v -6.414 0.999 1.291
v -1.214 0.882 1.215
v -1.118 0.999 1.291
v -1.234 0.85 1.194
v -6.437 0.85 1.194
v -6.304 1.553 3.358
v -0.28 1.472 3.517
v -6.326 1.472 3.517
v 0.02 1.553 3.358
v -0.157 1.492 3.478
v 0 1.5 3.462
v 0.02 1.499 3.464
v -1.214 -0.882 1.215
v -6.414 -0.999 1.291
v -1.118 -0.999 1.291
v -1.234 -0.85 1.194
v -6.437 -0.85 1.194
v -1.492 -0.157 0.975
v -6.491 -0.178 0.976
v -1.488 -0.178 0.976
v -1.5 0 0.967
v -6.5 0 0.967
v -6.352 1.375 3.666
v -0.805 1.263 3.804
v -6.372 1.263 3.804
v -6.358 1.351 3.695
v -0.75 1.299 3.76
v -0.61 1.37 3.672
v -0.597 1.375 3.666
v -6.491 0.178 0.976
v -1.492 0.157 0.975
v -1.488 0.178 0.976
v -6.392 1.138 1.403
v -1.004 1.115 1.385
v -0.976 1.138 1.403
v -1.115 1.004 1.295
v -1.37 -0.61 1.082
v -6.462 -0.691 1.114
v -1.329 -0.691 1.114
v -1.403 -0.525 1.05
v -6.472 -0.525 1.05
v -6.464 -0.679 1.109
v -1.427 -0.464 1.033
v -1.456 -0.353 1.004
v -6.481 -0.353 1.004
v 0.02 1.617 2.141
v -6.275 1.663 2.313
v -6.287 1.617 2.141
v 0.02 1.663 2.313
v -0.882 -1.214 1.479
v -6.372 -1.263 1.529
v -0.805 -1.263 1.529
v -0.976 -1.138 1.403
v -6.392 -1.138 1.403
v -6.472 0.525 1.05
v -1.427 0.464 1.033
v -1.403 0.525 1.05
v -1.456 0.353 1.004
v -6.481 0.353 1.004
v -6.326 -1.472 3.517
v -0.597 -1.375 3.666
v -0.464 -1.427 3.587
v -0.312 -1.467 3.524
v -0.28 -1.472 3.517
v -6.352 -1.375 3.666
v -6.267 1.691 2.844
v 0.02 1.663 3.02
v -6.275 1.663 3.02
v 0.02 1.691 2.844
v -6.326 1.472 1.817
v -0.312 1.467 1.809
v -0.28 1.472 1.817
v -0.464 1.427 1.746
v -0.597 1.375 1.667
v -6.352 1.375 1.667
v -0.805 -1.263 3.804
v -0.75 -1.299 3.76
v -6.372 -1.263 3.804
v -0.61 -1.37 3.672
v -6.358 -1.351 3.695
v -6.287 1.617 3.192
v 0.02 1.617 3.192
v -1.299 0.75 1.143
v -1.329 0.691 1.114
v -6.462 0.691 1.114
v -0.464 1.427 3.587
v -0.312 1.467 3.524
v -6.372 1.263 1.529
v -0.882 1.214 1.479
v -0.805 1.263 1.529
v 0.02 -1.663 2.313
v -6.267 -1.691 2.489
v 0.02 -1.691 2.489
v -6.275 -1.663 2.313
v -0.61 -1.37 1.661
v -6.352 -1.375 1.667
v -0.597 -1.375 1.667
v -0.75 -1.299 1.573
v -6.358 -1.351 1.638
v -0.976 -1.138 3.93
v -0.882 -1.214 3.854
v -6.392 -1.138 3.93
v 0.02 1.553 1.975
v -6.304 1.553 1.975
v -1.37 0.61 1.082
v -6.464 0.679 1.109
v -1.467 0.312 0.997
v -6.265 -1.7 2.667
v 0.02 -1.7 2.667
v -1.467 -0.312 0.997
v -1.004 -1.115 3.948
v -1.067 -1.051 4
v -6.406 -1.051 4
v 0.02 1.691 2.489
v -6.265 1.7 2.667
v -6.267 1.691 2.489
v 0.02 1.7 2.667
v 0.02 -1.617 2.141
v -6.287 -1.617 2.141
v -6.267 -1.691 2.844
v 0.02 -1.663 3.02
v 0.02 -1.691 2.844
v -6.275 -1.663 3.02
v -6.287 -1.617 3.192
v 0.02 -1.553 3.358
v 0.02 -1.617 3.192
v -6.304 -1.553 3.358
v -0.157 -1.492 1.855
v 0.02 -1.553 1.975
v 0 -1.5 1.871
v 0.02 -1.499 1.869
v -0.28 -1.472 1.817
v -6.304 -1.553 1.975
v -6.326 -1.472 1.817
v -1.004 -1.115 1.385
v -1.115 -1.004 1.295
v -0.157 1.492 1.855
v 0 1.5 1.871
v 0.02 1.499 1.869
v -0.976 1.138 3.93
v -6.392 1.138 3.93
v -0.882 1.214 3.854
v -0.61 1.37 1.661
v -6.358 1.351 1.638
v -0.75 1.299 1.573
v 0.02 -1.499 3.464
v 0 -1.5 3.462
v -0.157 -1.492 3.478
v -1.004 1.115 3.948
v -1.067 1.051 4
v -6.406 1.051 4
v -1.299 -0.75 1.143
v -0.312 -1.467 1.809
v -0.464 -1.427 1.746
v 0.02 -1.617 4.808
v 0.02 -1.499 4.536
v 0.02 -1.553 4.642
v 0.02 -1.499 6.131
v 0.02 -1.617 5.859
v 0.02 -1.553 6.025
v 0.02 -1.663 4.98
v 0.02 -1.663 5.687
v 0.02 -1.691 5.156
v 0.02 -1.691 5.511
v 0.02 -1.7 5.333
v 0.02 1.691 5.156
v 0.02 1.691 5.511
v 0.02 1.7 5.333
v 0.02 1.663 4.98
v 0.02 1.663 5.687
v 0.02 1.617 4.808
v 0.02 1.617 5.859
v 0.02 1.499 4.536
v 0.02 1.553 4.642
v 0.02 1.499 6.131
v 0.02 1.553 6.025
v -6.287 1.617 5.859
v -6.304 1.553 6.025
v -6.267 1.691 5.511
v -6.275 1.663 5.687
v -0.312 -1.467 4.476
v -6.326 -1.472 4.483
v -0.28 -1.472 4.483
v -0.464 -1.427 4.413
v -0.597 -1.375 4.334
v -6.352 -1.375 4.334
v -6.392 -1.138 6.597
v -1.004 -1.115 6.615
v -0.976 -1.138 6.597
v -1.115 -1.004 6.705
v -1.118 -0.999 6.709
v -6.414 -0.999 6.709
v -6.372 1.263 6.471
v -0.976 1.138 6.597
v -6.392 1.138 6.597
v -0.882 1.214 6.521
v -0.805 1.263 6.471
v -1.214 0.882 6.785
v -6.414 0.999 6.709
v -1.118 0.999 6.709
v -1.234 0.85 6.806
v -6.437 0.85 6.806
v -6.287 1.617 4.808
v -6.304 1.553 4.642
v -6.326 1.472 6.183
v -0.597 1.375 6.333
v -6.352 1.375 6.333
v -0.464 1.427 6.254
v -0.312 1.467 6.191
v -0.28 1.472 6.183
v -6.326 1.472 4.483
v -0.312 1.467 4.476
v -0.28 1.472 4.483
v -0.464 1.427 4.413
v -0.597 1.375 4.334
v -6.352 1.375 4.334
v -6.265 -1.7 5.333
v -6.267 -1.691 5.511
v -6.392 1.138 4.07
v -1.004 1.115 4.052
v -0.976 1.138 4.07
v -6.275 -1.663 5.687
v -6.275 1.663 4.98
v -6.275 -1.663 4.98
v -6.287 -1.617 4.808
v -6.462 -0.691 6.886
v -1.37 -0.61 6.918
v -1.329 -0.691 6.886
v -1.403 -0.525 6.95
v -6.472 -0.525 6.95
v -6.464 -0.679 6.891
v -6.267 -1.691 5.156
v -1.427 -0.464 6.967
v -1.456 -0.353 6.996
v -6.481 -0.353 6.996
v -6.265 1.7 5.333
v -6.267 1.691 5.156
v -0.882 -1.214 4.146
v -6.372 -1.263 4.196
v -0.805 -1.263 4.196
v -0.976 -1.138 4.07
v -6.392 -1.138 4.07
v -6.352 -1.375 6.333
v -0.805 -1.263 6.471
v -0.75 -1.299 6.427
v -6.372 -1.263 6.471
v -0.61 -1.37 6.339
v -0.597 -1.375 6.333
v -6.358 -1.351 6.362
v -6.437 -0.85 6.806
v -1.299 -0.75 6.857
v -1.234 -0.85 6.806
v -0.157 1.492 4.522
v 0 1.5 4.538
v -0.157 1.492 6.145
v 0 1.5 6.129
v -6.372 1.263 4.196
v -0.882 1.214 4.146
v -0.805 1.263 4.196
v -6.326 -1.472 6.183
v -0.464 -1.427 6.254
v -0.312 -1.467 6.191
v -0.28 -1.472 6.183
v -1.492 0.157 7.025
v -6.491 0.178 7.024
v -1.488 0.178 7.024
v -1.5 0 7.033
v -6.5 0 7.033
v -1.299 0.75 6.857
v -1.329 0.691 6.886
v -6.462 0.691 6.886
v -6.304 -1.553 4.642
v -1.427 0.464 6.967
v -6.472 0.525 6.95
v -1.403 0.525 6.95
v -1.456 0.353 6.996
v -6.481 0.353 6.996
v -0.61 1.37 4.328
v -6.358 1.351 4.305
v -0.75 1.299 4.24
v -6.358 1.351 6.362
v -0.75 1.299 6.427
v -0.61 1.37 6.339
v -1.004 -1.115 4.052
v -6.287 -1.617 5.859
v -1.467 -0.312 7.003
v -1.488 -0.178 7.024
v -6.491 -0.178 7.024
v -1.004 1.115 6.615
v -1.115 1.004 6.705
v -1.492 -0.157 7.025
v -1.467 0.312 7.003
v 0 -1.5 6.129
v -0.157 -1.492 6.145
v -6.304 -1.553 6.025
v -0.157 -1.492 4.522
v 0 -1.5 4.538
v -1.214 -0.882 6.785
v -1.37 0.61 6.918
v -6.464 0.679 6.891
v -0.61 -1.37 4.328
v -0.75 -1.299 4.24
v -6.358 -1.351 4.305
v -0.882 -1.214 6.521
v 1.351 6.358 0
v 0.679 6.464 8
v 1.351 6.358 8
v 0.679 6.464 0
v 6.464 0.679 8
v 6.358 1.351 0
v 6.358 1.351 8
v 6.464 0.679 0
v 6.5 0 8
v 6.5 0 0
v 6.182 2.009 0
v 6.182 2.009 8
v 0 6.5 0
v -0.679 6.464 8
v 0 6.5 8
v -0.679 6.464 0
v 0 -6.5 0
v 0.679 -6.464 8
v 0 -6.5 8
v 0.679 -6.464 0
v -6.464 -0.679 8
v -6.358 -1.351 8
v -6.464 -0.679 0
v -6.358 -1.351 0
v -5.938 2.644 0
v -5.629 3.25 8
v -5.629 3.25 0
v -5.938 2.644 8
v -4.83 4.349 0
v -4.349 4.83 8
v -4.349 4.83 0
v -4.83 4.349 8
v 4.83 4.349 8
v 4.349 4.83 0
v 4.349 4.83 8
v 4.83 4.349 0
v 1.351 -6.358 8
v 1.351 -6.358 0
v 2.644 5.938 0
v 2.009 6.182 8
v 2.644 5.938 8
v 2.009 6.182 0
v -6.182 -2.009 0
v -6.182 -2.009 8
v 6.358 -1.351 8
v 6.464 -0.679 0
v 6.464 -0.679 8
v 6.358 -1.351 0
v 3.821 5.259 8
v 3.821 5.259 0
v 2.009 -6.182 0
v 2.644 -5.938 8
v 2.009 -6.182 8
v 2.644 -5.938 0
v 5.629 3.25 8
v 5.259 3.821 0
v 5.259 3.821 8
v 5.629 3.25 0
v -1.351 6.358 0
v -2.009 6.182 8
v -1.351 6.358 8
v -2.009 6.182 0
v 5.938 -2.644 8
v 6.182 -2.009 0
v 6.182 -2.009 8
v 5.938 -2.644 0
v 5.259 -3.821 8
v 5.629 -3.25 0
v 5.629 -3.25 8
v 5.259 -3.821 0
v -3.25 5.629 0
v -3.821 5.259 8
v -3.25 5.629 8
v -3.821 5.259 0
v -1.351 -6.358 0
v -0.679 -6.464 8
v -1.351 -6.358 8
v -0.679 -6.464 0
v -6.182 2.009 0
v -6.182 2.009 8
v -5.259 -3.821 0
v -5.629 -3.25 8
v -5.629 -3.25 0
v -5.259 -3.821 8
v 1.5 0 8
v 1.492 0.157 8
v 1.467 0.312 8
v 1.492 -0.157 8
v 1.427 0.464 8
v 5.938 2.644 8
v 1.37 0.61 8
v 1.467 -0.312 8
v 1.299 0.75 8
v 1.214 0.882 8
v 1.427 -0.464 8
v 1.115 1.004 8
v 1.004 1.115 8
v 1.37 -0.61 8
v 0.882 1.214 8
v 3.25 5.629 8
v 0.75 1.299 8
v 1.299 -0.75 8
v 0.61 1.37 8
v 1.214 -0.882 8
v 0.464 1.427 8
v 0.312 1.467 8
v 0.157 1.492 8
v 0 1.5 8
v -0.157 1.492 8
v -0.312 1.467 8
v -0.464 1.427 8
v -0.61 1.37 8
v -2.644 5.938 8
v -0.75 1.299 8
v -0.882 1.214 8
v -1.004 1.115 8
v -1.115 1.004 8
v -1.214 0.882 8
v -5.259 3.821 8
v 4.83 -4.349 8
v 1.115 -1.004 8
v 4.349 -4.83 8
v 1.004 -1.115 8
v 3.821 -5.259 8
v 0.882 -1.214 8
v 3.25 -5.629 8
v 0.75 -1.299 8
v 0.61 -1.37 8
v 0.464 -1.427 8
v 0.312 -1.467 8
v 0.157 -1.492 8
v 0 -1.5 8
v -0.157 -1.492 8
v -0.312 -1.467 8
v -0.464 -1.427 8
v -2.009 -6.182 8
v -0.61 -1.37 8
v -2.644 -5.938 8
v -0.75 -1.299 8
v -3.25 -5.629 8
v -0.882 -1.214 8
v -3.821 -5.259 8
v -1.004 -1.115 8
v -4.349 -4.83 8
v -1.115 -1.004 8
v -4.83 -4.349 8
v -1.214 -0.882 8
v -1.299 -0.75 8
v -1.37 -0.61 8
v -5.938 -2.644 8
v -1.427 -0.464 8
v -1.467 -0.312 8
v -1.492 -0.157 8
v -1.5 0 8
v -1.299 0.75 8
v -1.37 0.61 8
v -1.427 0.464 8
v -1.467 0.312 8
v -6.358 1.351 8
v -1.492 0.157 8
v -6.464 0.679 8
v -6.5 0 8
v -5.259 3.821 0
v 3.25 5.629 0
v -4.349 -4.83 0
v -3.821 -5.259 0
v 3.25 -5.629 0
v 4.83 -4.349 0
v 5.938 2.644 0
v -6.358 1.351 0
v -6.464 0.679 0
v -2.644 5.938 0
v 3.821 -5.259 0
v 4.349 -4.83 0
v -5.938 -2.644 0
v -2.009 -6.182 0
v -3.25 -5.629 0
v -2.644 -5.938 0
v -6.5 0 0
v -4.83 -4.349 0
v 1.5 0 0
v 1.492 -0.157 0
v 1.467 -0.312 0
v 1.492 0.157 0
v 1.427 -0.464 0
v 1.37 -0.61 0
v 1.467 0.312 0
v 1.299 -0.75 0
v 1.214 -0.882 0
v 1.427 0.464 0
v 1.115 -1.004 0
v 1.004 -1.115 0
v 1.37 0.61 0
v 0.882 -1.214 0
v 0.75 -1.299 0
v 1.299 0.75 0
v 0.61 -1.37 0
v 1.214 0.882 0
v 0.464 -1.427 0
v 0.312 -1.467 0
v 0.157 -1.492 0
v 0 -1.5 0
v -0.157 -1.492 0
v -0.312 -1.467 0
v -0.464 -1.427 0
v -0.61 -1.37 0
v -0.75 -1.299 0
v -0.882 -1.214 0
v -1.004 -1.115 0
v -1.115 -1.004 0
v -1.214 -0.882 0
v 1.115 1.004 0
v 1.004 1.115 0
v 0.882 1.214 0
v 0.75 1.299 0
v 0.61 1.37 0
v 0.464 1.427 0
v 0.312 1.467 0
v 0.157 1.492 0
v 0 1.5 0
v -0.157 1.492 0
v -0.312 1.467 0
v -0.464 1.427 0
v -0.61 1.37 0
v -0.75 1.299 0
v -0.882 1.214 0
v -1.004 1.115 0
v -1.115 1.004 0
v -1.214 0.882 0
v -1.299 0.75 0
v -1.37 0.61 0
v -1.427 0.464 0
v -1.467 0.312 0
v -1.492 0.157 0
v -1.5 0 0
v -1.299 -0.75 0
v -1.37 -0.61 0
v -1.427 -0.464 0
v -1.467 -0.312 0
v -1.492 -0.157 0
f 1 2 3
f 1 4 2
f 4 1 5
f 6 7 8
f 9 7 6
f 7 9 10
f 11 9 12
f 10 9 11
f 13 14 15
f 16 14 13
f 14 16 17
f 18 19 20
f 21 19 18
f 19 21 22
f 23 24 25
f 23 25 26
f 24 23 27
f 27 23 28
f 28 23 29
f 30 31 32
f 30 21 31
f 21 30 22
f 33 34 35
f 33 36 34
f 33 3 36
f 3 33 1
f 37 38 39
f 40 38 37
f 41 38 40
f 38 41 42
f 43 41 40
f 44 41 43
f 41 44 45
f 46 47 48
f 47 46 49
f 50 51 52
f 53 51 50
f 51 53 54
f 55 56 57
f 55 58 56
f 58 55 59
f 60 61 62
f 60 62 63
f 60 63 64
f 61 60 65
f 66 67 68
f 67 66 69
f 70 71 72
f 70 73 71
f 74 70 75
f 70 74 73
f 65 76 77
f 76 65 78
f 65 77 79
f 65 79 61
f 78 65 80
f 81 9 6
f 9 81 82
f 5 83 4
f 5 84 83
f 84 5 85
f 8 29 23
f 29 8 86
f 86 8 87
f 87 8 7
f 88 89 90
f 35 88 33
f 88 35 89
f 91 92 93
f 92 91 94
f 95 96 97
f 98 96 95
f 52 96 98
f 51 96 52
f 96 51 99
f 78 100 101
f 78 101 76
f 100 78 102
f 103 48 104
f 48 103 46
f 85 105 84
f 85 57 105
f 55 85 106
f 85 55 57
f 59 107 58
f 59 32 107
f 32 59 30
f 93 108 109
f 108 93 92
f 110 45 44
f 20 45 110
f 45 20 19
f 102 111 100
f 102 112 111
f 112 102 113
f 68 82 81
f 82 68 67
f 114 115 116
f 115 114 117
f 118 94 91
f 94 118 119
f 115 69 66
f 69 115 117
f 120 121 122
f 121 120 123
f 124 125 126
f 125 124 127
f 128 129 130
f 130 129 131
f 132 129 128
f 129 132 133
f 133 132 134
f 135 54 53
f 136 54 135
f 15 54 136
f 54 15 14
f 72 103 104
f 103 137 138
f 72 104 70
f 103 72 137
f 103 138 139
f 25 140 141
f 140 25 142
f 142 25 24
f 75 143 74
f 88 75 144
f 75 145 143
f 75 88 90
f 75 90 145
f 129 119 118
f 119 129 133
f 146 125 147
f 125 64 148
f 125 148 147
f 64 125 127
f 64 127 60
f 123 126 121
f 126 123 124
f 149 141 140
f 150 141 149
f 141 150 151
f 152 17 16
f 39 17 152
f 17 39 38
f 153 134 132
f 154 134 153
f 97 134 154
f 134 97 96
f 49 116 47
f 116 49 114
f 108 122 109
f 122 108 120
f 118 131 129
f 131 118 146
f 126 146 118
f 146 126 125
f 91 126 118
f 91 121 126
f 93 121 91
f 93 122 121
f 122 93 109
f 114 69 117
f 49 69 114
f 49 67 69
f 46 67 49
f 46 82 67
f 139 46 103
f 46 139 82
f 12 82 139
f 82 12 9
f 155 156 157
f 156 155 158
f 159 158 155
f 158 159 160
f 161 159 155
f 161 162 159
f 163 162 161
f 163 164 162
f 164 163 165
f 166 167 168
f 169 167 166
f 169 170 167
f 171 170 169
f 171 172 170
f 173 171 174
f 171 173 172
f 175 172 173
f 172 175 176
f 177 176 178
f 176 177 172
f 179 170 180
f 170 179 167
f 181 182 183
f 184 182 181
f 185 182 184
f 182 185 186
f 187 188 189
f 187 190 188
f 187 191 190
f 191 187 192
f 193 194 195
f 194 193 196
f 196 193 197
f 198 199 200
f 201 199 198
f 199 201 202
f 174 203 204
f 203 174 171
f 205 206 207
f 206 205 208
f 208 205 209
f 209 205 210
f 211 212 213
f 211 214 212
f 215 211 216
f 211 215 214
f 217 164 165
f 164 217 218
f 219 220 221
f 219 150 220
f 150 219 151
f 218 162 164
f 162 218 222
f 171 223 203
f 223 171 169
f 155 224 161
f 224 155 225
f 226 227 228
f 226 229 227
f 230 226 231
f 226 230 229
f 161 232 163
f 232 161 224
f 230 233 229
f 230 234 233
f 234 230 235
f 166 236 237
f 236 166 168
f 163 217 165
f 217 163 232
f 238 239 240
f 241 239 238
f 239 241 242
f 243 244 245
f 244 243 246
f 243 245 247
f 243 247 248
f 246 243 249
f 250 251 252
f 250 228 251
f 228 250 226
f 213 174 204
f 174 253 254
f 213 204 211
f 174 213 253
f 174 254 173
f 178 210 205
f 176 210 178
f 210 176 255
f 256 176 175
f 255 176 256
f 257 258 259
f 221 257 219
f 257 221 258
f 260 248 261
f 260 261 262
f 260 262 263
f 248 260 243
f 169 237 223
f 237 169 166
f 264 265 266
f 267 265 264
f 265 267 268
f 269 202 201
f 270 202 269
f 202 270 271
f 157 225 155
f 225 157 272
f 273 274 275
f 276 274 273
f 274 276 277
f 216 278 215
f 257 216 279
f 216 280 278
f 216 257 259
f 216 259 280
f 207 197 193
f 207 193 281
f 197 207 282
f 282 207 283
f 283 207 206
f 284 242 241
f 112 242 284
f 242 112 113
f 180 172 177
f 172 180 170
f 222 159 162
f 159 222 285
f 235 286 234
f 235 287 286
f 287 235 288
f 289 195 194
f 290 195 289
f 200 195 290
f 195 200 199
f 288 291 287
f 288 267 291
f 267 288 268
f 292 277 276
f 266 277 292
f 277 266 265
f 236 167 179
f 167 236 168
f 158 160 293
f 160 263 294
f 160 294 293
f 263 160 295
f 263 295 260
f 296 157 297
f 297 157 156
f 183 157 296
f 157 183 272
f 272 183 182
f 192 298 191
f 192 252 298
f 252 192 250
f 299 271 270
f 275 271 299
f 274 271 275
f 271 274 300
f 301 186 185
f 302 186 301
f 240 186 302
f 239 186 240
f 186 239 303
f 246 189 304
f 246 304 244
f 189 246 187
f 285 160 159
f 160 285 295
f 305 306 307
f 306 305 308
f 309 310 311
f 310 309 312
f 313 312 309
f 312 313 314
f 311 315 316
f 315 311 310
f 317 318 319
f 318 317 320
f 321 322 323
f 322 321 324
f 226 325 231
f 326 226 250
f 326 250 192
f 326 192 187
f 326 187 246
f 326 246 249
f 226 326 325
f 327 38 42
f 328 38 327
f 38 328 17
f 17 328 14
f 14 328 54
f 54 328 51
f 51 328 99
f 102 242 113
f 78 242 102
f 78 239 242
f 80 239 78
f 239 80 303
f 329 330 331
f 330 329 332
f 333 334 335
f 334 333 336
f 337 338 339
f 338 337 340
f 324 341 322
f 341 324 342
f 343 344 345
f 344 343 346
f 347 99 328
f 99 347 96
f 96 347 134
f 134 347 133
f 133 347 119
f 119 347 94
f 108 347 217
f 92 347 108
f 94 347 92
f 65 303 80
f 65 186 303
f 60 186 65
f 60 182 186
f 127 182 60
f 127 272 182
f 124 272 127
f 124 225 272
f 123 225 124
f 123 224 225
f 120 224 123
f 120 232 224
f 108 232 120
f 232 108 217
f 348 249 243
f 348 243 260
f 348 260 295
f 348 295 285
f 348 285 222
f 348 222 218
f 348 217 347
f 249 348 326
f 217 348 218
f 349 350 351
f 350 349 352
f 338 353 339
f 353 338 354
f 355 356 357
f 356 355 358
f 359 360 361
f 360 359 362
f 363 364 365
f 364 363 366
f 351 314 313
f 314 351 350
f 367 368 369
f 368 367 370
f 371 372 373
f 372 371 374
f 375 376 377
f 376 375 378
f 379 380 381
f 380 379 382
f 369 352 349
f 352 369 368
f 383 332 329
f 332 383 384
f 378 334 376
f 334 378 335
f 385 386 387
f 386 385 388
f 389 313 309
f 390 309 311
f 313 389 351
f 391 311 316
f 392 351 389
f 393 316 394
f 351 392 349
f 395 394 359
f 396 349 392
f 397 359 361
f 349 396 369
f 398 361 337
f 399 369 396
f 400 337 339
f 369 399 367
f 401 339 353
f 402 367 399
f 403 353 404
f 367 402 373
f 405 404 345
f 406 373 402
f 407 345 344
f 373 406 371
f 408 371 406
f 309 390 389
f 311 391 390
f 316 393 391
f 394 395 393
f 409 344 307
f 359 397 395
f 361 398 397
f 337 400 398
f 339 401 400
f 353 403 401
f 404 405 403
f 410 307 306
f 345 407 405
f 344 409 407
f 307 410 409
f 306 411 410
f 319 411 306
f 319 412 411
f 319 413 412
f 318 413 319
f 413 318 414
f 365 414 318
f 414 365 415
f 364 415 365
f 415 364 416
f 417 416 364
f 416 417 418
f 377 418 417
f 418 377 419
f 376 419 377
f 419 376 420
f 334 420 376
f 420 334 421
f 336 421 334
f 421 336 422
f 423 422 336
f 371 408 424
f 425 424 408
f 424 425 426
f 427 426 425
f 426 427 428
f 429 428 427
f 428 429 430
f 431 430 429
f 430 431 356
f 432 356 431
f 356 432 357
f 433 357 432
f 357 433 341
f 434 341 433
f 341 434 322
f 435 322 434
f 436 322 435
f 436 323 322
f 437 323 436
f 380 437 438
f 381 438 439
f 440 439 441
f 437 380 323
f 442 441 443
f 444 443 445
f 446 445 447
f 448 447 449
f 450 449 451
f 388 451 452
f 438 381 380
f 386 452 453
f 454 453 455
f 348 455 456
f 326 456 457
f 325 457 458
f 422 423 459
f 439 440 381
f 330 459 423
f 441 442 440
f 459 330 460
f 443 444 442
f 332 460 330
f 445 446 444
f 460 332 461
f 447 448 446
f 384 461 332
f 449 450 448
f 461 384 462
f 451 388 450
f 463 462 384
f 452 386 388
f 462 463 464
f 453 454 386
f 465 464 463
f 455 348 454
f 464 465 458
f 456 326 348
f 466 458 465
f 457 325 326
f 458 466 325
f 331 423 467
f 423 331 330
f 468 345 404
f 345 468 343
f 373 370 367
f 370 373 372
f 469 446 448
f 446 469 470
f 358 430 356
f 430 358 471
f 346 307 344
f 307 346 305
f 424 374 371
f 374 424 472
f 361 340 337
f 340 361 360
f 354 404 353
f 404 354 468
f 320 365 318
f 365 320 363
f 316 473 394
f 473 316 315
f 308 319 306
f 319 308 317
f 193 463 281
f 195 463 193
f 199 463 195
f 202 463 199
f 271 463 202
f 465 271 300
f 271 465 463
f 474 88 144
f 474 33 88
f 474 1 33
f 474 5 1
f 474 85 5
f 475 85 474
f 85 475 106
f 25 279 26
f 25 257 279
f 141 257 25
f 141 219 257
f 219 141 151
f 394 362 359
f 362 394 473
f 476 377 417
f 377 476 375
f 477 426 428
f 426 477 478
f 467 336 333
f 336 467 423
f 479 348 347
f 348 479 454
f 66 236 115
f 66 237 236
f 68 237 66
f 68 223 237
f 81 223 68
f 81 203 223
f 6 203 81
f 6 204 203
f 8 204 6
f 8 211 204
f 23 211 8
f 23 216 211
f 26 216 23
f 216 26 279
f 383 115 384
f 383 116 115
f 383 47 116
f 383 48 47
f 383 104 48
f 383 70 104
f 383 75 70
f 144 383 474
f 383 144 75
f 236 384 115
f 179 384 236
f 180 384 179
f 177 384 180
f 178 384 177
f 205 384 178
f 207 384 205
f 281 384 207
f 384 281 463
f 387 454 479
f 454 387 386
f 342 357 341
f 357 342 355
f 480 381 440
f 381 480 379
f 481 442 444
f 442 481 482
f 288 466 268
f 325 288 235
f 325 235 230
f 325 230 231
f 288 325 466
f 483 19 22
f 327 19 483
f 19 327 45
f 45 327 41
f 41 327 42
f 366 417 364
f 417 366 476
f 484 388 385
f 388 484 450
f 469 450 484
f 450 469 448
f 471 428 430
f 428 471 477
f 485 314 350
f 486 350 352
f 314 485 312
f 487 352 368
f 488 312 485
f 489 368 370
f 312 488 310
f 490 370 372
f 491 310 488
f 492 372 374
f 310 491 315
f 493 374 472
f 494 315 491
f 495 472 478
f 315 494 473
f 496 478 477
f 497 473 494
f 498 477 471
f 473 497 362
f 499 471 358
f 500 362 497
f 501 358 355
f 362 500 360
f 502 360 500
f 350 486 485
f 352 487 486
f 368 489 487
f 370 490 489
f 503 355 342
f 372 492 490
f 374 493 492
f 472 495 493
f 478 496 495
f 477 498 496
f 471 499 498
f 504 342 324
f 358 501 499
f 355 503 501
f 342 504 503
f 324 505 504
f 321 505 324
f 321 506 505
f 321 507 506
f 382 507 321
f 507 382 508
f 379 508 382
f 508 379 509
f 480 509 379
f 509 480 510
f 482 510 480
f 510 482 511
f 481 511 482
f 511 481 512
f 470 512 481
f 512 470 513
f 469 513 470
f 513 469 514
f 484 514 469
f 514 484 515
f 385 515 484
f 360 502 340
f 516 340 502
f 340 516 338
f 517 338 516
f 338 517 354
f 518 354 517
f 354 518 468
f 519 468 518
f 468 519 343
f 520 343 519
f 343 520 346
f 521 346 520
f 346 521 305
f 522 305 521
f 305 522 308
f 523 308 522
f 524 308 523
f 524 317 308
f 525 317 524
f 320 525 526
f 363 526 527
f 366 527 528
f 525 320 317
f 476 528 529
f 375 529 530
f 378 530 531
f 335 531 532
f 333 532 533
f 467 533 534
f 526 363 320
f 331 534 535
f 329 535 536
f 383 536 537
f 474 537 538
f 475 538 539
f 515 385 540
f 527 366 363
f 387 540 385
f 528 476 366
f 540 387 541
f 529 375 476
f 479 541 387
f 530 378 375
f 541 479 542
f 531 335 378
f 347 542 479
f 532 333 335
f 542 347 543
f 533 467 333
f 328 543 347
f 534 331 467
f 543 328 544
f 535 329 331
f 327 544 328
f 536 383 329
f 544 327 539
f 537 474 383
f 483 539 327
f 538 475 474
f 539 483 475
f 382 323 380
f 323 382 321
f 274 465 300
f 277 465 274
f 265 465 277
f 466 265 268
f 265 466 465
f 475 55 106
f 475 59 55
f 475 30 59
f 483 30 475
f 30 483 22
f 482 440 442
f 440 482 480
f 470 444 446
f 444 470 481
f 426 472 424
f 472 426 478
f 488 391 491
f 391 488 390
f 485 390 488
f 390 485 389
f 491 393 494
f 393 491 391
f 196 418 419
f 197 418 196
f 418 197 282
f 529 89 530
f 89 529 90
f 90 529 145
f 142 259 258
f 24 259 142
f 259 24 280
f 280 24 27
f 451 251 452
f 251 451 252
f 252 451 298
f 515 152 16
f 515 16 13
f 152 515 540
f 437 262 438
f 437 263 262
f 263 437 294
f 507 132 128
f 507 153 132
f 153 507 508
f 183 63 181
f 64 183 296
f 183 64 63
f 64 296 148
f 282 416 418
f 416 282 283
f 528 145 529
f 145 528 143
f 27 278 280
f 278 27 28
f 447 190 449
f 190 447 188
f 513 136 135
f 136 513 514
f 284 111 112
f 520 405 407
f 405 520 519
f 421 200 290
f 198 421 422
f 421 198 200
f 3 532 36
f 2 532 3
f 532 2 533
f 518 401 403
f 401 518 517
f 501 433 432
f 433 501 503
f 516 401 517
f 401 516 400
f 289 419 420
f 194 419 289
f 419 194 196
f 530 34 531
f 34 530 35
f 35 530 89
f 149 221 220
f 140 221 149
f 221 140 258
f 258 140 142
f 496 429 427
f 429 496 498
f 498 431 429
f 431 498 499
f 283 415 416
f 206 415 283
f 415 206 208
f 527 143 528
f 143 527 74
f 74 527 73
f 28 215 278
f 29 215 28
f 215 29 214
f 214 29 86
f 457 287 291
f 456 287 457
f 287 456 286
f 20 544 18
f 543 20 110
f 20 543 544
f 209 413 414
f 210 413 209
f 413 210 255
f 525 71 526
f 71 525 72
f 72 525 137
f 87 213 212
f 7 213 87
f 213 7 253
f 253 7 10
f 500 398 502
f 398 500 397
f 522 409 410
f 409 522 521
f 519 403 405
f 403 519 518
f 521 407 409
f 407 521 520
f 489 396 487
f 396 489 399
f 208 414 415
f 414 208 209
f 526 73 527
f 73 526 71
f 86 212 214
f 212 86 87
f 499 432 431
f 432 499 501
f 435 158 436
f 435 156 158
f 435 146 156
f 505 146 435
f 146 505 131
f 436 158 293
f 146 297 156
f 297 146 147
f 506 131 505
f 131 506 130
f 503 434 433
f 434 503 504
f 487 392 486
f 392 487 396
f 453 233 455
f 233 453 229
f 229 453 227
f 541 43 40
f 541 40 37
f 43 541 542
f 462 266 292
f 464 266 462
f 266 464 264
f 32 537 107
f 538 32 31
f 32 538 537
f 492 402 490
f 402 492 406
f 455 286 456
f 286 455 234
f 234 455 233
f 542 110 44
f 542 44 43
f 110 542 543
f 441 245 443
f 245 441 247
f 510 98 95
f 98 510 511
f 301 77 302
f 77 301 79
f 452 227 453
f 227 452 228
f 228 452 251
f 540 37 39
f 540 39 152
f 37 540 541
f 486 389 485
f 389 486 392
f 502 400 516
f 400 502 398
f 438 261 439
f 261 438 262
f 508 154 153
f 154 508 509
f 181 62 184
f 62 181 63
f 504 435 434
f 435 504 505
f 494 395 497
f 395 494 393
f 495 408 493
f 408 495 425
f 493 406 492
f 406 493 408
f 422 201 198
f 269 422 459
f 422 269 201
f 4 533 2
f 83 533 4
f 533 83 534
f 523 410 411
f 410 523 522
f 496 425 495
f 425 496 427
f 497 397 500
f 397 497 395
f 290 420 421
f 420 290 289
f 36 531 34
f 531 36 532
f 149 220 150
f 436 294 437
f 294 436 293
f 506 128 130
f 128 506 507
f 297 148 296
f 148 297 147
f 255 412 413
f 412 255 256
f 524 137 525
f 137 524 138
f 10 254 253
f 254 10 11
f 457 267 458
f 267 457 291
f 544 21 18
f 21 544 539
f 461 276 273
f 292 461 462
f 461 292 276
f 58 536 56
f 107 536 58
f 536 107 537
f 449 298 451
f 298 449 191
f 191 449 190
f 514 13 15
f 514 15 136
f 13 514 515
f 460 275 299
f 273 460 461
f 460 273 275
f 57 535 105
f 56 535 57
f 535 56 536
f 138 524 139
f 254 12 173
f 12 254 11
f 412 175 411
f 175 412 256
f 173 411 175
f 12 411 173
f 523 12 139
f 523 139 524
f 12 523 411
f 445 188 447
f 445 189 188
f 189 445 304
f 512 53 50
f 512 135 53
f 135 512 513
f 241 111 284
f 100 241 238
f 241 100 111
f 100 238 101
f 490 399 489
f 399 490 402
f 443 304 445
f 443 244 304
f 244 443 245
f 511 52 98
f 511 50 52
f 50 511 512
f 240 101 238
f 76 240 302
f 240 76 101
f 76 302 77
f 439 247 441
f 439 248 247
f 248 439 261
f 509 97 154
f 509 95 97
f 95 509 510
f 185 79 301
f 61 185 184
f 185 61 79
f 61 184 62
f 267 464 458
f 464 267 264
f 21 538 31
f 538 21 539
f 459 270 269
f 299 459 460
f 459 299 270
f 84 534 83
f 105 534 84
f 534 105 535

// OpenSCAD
// Double-screw locking collar.
$fn = 60;
eps = 0.02;
shaft_d = 3;
outer_d = 13;
width = 8;
difference() {
    cylinder(d=outer_d,h=width);
    translate([0,0,-eps]) cylinder(d=shaft_d,h=width+2*eps);
    for (z=[width/3,2*width/3]) translate([-outer_d/2-eps,0,z]) rotate([0,90,0]) cylinder(d=3.4,h=outer_d/2+2*eps);
}
